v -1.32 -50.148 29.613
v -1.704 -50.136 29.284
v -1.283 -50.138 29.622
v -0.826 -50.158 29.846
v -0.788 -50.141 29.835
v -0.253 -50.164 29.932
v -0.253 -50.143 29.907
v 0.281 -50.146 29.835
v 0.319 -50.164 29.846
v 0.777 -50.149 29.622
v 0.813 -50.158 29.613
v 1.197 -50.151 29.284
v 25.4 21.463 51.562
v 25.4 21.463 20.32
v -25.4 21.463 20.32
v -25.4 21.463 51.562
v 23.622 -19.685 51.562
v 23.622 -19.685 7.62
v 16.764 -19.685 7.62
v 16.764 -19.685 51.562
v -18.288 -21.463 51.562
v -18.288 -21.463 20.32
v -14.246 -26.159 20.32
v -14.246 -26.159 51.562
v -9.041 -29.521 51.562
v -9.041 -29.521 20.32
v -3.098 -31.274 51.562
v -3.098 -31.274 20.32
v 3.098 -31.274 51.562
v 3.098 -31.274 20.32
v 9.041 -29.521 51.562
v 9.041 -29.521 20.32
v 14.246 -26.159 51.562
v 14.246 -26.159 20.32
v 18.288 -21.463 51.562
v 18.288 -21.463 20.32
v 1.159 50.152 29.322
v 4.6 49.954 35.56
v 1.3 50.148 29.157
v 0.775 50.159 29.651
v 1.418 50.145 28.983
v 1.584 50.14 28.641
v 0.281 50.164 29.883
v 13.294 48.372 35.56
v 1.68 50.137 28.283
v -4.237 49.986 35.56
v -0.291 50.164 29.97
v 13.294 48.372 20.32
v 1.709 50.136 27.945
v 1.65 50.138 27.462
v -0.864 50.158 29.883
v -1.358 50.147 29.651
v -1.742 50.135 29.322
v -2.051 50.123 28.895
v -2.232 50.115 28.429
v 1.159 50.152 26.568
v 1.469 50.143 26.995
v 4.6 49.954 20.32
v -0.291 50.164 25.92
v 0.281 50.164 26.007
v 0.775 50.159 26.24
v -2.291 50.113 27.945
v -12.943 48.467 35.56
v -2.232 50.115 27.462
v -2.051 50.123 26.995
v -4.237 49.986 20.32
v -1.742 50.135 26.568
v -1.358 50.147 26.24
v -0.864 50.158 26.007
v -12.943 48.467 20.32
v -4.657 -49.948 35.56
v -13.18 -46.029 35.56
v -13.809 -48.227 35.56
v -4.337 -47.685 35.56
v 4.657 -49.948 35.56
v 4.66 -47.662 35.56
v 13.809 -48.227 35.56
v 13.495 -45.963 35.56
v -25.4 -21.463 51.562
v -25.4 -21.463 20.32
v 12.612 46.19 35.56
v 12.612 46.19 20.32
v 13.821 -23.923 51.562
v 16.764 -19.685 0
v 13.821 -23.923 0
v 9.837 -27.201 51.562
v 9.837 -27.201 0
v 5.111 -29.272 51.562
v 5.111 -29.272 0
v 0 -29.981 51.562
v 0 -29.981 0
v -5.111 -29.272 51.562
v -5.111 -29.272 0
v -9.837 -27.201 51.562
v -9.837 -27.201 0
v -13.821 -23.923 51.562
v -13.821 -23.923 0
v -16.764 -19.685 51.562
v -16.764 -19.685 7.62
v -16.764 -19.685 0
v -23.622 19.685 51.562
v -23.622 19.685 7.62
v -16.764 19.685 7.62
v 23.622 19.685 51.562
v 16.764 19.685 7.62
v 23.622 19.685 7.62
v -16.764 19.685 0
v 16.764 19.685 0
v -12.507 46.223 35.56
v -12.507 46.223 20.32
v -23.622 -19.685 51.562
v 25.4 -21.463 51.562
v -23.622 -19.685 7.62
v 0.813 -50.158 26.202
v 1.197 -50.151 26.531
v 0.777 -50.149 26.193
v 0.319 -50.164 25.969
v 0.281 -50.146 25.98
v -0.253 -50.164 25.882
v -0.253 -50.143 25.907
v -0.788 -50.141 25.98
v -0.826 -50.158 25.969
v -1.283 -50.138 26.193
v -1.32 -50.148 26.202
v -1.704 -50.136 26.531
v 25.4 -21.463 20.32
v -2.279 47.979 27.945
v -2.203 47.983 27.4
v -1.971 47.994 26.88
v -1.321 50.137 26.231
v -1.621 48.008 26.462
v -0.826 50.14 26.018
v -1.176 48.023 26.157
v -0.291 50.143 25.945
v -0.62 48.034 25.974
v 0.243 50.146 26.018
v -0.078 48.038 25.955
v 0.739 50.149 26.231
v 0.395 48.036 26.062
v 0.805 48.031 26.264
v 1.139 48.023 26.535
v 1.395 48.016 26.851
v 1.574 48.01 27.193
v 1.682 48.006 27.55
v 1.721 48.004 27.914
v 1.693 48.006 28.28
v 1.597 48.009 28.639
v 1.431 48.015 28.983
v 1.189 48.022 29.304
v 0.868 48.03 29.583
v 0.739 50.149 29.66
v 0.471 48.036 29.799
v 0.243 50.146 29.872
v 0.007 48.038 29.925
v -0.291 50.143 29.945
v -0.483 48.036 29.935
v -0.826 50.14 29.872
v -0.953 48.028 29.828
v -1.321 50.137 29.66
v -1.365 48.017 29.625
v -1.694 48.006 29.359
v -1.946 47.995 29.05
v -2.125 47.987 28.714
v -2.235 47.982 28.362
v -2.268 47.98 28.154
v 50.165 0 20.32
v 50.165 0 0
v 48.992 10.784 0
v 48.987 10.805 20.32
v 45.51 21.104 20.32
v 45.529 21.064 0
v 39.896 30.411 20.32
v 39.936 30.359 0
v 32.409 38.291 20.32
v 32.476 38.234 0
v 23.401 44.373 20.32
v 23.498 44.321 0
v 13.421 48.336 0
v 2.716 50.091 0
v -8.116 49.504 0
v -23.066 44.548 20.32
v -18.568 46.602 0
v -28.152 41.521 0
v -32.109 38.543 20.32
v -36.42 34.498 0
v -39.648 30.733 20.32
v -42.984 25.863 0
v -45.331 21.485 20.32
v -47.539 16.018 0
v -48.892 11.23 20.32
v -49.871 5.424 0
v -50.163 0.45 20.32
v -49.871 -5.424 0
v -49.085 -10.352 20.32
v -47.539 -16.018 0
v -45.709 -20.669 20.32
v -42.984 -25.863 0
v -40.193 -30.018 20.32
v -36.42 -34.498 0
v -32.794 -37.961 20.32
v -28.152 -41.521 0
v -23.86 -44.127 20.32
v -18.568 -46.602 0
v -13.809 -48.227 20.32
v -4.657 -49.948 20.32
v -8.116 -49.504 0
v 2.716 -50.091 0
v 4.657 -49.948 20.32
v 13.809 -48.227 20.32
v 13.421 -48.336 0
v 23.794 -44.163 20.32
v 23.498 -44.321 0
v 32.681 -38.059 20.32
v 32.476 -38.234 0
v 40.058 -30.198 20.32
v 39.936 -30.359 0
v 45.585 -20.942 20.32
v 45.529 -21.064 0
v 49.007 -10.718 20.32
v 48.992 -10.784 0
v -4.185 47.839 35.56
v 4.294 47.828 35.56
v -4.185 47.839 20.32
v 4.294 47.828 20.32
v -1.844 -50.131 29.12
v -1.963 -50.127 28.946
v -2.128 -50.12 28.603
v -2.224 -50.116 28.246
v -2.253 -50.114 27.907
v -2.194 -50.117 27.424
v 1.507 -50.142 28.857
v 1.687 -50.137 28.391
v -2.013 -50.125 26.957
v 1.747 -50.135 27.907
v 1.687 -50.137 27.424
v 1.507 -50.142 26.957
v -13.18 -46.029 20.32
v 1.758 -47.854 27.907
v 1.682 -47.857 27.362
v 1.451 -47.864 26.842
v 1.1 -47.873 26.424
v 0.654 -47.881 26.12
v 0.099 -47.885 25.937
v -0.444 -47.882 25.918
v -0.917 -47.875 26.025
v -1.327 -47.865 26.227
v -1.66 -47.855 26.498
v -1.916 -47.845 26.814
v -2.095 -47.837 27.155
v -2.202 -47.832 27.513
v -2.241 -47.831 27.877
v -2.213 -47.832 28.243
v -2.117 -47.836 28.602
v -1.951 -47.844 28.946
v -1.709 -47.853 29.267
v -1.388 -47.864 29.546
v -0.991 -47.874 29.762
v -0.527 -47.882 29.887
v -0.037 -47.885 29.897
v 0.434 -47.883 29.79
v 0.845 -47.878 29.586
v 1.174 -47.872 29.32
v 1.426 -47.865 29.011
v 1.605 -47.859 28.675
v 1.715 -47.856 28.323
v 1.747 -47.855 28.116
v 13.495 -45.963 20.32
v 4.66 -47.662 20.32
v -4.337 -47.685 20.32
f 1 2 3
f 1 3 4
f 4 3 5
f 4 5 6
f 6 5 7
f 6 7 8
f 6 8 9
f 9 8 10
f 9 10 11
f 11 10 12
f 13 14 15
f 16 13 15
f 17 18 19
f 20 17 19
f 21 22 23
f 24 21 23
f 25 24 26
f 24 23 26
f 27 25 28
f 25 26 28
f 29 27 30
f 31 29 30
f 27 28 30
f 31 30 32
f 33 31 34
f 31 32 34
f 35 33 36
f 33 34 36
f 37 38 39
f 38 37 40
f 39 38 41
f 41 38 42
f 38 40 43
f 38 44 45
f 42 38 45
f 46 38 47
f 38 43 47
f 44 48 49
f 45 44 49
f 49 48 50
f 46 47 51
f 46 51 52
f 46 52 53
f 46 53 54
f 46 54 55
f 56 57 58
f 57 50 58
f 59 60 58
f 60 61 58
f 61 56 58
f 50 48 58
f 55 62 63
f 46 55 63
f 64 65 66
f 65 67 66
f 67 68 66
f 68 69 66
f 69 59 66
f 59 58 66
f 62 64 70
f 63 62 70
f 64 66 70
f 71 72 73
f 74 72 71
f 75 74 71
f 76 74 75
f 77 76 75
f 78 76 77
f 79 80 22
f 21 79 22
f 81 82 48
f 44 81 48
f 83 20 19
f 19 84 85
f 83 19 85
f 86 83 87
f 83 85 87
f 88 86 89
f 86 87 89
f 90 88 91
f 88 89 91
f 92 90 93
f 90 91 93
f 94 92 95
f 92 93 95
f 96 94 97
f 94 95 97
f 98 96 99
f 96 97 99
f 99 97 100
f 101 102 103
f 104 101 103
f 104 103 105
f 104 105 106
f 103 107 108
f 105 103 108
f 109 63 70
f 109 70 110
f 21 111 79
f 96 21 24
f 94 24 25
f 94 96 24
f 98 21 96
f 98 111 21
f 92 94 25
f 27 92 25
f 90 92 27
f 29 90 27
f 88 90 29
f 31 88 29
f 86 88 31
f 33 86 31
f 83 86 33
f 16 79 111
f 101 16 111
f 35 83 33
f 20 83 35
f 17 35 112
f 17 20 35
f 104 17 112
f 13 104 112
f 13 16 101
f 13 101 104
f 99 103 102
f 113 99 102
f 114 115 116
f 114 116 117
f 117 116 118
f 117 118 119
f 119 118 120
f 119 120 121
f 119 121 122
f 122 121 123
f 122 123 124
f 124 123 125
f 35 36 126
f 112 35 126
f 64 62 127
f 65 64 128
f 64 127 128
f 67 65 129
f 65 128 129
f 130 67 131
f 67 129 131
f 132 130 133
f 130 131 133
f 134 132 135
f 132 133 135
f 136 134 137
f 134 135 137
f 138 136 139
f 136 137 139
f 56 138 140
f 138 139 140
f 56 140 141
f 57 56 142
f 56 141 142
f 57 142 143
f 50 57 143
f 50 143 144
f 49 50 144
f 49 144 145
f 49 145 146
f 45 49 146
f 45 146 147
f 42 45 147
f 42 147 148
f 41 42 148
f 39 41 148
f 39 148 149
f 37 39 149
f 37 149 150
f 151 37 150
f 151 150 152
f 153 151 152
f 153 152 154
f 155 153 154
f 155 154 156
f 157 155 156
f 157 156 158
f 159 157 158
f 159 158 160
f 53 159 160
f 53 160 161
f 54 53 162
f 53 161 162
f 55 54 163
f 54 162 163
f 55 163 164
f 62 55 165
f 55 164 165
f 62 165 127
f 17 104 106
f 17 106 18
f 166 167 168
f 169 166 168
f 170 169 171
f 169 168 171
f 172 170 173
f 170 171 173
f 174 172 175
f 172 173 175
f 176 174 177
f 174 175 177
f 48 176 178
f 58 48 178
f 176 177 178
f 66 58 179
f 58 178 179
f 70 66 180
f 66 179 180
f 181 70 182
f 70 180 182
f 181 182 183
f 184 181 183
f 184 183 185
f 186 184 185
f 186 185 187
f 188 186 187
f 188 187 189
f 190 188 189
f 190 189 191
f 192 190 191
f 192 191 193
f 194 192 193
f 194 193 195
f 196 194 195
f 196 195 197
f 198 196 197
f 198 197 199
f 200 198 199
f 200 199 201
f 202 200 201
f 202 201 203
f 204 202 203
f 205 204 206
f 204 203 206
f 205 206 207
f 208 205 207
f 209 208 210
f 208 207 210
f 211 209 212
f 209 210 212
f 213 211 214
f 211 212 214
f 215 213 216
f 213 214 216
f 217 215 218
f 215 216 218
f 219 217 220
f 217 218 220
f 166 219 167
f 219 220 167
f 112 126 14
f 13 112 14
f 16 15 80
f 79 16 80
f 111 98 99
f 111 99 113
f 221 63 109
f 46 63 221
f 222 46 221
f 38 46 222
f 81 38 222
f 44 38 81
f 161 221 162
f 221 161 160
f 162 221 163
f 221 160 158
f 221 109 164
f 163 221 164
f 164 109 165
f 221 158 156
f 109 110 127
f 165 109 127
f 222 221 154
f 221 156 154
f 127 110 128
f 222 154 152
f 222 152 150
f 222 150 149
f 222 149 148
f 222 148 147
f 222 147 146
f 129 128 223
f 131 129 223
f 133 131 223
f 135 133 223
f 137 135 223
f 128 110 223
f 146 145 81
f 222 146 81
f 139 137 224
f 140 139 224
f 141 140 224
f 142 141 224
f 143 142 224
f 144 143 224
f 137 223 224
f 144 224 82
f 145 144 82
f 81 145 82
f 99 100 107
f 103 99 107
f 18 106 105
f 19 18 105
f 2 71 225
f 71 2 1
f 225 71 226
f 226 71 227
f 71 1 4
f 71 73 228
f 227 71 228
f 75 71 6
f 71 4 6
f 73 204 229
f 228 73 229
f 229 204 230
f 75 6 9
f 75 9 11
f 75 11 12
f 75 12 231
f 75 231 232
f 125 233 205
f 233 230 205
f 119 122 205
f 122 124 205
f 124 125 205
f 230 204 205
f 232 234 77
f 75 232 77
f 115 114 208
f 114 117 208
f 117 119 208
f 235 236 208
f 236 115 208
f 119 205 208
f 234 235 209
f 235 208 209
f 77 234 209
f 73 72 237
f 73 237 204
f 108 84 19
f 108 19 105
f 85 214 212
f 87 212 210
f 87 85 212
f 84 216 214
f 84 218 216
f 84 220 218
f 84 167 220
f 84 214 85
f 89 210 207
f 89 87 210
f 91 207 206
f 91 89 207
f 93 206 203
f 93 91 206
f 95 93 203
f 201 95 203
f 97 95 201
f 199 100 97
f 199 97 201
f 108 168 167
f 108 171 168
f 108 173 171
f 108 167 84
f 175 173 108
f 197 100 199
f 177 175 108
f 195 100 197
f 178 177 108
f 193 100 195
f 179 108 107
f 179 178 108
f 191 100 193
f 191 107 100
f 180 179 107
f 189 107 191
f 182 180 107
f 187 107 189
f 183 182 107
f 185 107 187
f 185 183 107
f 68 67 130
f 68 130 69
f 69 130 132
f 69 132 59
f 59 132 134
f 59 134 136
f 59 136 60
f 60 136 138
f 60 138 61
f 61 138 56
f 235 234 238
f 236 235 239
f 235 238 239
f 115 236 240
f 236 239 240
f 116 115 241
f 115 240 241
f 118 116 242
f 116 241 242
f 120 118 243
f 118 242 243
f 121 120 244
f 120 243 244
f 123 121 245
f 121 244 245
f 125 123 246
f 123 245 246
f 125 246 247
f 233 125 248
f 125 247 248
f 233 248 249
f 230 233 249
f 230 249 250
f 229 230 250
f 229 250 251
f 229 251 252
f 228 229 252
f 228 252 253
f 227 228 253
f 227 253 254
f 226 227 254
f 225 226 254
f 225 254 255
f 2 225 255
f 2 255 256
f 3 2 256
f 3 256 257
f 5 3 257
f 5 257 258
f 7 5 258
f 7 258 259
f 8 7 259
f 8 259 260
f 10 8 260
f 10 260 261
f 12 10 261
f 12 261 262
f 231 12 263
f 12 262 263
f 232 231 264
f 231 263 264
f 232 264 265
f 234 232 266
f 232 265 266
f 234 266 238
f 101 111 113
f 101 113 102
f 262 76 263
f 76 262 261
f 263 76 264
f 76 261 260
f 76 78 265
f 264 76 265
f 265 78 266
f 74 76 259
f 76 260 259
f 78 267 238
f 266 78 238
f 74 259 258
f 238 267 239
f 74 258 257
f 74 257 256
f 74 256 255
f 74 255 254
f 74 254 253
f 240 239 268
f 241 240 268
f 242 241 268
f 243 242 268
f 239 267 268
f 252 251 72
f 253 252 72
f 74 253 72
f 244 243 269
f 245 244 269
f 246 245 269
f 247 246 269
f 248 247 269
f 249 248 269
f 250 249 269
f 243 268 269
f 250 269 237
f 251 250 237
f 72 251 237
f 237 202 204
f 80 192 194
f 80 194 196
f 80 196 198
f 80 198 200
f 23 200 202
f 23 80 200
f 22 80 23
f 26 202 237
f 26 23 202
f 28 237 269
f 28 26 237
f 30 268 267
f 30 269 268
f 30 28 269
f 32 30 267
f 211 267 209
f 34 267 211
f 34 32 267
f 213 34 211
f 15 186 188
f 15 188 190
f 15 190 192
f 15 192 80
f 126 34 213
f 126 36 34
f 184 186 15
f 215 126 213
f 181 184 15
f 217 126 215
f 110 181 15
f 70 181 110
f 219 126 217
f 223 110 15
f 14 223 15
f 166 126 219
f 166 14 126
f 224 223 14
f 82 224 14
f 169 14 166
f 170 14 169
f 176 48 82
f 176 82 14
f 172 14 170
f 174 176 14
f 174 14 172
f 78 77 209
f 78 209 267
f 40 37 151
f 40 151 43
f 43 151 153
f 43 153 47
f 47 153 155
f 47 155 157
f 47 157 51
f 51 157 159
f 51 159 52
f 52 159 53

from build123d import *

# Parameters (mm, degrees)
SKETCH1_R                       = 50.165
BOSS_EXTRUDE1_DEPTH             = 20.32
SKETCH4_W                       = 6.858
SKETCH4_H                       = 39.37
BOSS_EXTRUDE3_DEPTH             = 7.62
BOSS_EXTRUDE4_DEPTH             = 31.242
BOSS_EXTRUDE5_DEPTH             = 15.24
F_4_0MM_DOWEL_HOLE1_D           = 4
F_4_0MM_DOWEL_HOLE1_DEPTH       = 3.81
F_4_0MM_DOWEL_HOLE1_CSINK_D     = 4.05
F_4_0MM_DOWEL_HOLE1_CSINK_ANGLE = 100
F_4_0MM_DOWEL_HOLE1_TIP         = 1.201721238
F_4_0MM_DOWEL_HOLE2_D           = 4
F_4_0MM_DOWEL_HOLE2_DEPTH       = 3.81
F_4_0MM_DOWEL_HOLE2_CSINK_D     = 4.05
F_4_0MM_DOWEL_HOLE2_CSINK_ANGLE = 100
F_4_0MM_DOWEL_HOLE2_TIP         = 1.201721238


with BuildPart() as part:
    # Sketch1 → Boss-Extrude1 (new body)
    with BuildSketch(Plane.XY):
        Circle(SKETCH1_R)
        with BuildLine():
            Line((16.764, -19.685), (23.622, -19.685))
            Line((23.622, -19.685), (23.622, 19.685))
            Line((23.622, 19.685), (-23.622, 19.685))
            Line((-23.622, 19.685), (-23.622, -19.685))
            Line((-23.622, -19.685), (-16.764, -19.685))
            ThreePointArc((-16.764, -19.685), (0, -29.98053413), (16.764, -19.685))
        make_face(mode=Mode.SUBTRACT)
    extrude(amount=BOSS_EXTRUDE1_DEPTH)

    # Sketch4 → Boss-Extrude3 (add)
    with BuildSketch(Plane(origin=(0, 0, 0), x_dir=(-1, 0, 0), z_dir=(0, 0, -1))):
        with Locations((-20.193, 0)):
            Rectangle(SKETCH4_W, SKETCH4_H)
        with Locations((20.193, 0)):
            Rectangle(SKETCH4_W, SKETCH4_H)
    extrude(amount=-BOSS_EXTRUDE3_DEPTH)

    # Sketch5 → Boss-Extrude4 (add)
    with BuildSketch(Plane.XY.offset(20.32)):
        with BuildLine():
            ThreePointArc((-18.288, -21.463), (0, -31.496), (18.288, -21.463))
            Line((18.288, -21.463), (25.4, -21.463))
            Line((25.4, -21.463), (25.4, 21.463))
            Line((25.4, 21.463), (-25.4, 21.463))
            Line((-25.4, 21.463), (-25.4, -21.463))
            Line((-25.4, -21.463), (-18.288, -21.463))
        make_face()
        with BuildLine():
            Line((-16.764, -19.685), (-23.622, -19.685))
            Line((-23.622, -19.685), (-23.622, 19.685))
            Line((-23.622, 19.685), (23.622, 19.685))
            Line((23.622, 19.685), (23.622, -19.685))
            Line((23.622, -19.685), (16.764, -19.685))
            ThreePointArc((16.764, -19.685), (0, -29.98053413), (-16.764, -19.685))
        make_face(mode=Mode.SUBTRACT)
    extrude(amount=BOSS_EXTRUDE4_DEPTH)

    # Sketch6 → Boss-Extrude5 (add)
    with BuildSketch(Plane.XY.offset(20.32)):
        with BuildLine():
            Line((13.809066775, -48.226931271), (13.49453303, -45.962673219))
            ThreePointArc((13.49453303, -45.962673219), (0.162084285, -47.884773517), (-13.179792846, -46.029248327))
            Line((-13.179792846, -46.029248327), (-13.809066775, -48.226931271))
            ThreePointArc((-13.809066775, -48.226931271), (0, -50.165), (13.809066775, -48.226931271))
        make_face()
        with BuildLine():
            Line((-12.94251142, 48.466675388), (-12.507062463, 46.222531853))
            ThreePointArc((-12.507062463, 46.222531853), (0.054767522, 48.038227874), (12.611793827, 46.189602713))
            Line((12.611793827, 46.189602713), (13.293700106, 48.371528428))
            ThreePointArc((13.293700106, 48.371528428), (0.181924735, 50.164670121), (-12.94251142, 48.466675388))
        make_face()
    extrude(amount=BOSS_EXTRUDE5_DEPTH)

    # Ø4.0mm Dowel Hole1
    with Locations(Plane(origin=(-0.291325712, 50.164154078, 27.945133858), x_dir=(0.999983137201, 0.005807349979, 0), z_dir=(-0.005807349979, 0.999983137201, 0))):
        with Locations((0, 0)):
            CounterSinkHole(F_4_0MM_DOWEL_HOLE1_D / 2, F_4_0MM_DOWEL_HOLE1_CSINK_D / 2, depth=F_4_0MM_DOWEL_HOLE1_DEPTH, counter_sink_angle=F_4_0MM_DOWEL_HOLE1_CSINK_ANGLE)
            with Locations((0, 0, -(F_4_0MM_DOWEL_HOLE1_DEPTH + F_4_0MM_DOWEL_HOLE1_TIP / 2))):  # 118° drill point
                Cone(0, F_4_0MM_DOWEL_HOLE1_D / 2, F_4_0MM_DOWEL_HOLE1_TIP, mode=Mode.SUBTRACT)

    # Ø4.0mm Dowel Hole2
    with Locations(Plane(origin=(-0.253466909, -50.164359654, 27.907450527), x_dir=(-0.99998723521, 0.005052664379, 0), z_dir=(-0.005052664379, -0.99998723521, 0))):
        with Locations((0, 0)):
            CounterSinkHole(F_4_0MM_DOWEL_HOLE2_D / 2, F_4_0MM_DOWEL_HOLE2_CSINK_D / 2, depth=F_4_0MM_DOWEL_HOLE2_DEPTH, counter_sink_angle=F_4_0MM_DOWEL_HOLE2_CSINK_ANGLE)
            with Locations((0, 0, -(F_4_0MM_DOWEL_HOLE2_DEPTH + F_4_0MM_DOWEL_HOLE2_TIP / 2))):  # 118° drill point
                Cone(0, F_4_0MM_DOWEL_HOLE2_D / 2, F_4_0MM_DOWEL_HOLE2_TIP, mode=Mode.SUBTRACT)


solid = part.part
